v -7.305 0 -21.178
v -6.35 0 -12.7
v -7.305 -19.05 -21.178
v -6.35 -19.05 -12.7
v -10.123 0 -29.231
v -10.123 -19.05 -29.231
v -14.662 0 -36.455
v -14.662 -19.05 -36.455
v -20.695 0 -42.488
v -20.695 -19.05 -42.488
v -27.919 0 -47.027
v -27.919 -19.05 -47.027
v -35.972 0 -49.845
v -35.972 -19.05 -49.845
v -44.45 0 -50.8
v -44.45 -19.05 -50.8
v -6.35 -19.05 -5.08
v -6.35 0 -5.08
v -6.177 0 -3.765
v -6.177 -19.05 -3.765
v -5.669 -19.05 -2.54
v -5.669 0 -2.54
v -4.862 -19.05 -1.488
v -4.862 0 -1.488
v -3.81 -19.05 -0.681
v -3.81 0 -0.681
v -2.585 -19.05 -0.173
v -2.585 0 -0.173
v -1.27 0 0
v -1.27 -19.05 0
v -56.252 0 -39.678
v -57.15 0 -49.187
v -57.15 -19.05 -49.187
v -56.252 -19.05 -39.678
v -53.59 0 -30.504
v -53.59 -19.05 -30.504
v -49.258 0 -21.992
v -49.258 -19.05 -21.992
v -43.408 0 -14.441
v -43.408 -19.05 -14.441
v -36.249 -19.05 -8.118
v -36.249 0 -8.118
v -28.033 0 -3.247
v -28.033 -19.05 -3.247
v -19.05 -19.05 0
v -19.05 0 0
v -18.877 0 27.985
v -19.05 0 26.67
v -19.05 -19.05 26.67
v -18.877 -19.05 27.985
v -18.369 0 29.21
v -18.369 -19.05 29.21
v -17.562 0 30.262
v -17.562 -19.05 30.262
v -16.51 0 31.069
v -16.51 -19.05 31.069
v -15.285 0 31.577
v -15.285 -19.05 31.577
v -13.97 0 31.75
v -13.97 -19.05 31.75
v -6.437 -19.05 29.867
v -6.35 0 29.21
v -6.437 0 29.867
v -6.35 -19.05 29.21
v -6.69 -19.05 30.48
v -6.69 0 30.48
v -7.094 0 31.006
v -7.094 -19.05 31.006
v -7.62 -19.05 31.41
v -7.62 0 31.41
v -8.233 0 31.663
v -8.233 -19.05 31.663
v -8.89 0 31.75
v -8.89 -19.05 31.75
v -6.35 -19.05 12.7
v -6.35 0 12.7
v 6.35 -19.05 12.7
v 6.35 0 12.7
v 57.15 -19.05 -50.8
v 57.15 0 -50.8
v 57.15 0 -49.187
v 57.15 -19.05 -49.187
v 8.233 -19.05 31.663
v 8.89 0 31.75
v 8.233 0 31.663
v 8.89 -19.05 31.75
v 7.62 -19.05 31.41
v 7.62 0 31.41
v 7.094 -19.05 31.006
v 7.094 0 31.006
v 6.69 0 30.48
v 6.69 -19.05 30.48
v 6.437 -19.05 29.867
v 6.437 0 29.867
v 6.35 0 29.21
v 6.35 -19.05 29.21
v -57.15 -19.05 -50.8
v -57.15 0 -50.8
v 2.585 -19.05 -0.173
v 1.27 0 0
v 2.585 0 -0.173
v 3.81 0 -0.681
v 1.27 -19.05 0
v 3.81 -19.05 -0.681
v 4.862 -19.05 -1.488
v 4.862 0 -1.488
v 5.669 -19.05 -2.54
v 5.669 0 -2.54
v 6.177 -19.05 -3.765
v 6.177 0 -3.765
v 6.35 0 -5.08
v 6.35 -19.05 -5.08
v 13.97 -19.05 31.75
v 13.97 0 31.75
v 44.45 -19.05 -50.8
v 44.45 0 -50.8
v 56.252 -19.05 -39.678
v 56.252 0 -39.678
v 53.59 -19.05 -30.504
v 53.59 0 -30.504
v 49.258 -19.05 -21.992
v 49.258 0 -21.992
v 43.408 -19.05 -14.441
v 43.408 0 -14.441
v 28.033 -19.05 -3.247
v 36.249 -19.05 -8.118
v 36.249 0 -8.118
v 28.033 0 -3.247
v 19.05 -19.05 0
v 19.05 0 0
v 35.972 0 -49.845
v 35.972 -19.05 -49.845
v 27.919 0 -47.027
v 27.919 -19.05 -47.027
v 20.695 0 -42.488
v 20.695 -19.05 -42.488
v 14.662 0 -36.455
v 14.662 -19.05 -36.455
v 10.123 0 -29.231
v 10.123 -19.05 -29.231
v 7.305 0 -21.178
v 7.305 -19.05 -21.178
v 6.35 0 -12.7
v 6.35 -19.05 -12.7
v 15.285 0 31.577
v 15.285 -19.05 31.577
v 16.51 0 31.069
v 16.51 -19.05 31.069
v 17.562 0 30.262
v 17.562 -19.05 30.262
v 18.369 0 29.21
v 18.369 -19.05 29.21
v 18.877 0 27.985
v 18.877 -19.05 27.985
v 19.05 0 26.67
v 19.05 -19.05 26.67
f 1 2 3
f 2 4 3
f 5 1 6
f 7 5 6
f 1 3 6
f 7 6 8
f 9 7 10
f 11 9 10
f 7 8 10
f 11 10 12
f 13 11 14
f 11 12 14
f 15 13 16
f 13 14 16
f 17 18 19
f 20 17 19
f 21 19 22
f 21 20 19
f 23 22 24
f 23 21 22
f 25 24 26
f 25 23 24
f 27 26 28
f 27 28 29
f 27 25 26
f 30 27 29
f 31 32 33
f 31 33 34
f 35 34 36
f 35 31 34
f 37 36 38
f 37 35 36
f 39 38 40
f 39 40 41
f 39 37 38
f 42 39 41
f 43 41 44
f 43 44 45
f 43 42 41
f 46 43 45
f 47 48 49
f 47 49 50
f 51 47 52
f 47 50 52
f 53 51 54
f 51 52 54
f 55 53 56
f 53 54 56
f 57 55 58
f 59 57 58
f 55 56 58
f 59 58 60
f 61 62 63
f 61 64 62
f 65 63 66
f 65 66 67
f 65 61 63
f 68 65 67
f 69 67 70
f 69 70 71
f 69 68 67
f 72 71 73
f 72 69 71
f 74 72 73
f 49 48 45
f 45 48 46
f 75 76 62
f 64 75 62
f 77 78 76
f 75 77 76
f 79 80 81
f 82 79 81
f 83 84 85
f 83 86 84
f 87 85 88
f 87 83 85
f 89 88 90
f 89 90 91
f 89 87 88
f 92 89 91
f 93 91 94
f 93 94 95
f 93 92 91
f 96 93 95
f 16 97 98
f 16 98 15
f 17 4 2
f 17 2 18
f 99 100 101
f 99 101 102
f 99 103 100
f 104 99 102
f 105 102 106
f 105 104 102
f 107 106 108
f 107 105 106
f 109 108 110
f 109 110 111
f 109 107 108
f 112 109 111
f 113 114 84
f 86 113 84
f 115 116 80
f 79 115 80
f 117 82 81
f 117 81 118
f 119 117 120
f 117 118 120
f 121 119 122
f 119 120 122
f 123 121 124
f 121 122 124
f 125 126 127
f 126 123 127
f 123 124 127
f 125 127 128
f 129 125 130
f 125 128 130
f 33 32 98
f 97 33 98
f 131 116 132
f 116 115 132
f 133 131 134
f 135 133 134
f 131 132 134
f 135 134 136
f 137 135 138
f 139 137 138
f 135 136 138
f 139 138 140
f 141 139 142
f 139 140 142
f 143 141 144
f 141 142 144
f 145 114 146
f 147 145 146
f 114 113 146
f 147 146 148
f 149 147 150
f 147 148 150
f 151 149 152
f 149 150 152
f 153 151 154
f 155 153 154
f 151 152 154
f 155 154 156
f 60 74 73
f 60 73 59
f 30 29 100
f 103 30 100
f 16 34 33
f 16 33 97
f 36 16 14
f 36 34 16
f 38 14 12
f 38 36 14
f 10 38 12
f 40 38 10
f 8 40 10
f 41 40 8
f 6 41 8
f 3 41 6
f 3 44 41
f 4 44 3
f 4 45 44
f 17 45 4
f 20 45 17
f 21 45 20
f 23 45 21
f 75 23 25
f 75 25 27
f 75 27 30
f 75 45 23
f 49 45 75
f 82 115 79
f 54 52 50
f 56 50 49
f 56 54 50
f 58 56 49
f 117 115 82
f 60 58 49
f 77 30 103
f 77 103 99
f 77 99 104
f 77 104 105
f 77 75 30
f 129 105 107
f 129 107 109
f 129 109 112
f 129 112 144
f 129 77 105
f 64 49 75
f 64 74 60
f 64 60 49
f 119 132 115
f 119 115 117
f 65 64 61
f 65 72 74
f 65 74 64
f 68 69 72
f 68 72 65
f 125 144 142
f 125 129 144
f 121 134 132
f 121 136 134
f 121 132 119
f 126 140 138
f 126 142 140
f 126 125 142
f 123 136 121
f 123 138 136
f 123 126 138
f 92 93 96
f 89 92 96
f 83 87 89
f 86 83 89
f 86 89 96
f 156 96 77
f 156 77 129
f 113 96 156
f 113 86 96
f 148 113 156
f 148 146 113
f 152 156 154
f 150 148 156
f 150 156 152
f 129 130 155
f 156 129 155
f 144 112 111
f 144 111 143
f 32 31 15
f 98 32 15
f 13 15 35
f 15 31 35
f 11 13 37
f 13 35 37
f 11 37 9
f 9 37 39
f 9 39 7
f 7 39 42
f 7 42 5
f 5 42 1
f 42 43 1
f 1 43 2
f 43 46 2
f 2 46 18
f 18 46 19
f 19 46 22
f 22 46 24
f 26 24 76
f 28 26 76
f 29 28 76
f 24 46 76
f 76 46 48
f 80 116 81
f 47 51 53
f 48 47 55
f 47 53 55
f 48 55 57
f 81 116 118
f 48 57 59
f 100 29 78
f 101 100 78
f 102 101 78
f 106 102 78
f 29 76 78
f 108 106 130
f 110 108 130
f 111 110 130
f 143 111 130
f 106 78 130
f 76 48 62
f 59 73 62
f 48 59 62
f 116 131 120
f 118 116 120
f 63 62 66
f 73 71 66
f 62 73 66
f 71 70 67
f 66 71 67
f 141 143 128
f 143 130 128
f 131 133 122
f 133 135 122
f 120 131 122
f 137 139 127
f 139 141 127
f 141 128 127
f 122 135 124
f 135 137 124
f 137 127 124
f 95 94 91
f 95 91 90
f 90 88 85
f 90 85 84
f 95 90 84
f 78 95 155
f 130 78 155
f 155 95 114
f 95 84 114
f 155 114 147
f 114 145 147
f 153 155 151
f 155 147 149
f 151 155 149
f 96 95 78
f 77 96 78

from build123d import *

# Parameters (mm, degrees)
F0_W        = 6.35
F0_H        = 12.7
F1_DEPTH    = 19.05
F2_R        = 2.54
F3_R        = 38.1
F4_T1_DEPTH = 264.9844424842
F5_R        = 5.08
F6_R        = 5.08


# Not quite as in the source:
# - a fillet or chamfer that OpenCascade refuses, or shapes differently, is made with other operations: its cross-section is extruded or revolved along the edge and cut away or added


with BuildPart() as f1:
    # F0 (on Front) → F1 (new body)
    with BuildSketch(Plane.XZ):
        Polygon((-6.35, -50.8), (-6.35, 0), (-19.05, 0), (-57.15, 0), (-57.15, -50.8), align=None)
        Polygon((-19.05, 0), (-6.35, 0), (-6.35, 12.7), (-6.35, 31.75), (-19.05, 31.75), align=None)
        with Locations((-3.175, 6.35)):
            Rectangle(F0_W, F0_H)
        with Locations((3.175, 6.35)):
            Rectangle(F0_W, F0_H)
        Polygon((6.35, 12.7), (6.35, 0), (19.05, 0), (19.05, 31.75), (6.35, 31.75), align=None)
        Polygon((19.05, 0), (6.35, 0), (6.35, -50.8), (57.15, -50.8), (57.15, 0), align=None)
    extrude(amount=F1_DEPTH)

    # F2
    f2_edges = [f1.edges().sort_by_distance(p)[0] for p in [
        (6.35, -9.525, 31.75),
        (-6.35, -9.525, 31.75),
    ]]
    fillet(f2_edges, radius=F2_R)

    # F3
    f3_edges = [f1.edges().sort_by_distance(p)[0] for p in [
        (6.35, -9.525, -50.8),
        (-6.35, -9.525, -50.8),
    ]]
    fillet(f3_edges, radius=F3_R)

    # F4: fillet of radius 50.8 on 2 edges, made by hand

    # F4_s2 → F4_t1 (cut)
    with BuildSketch(Plane.XZ.offset(-122.9672212421)):
        with BuildLine():
            ThreePointArc((-57.15, -49.1868884968), (-46.5109262841, -18.0783687635), (-19.05, 0))
            Line((-19.05, 0), (-57.15, 0))
            Line((-57.15, 0), (-57.15, -49.1868884968))
        make_face()
        with BuildLine():
            ThreePointArc((57.15, -49.1868884968), (46.5109262841, -18.0783687635), (19.05, 0))
            Line((19.05, 0), (57.15, 0))
            Line((57.15, 0), (57.15, -49.1868884968))
        make_face()
    extrude(amount=F4_T1_DEPTH, mode=Mode.SUBTRACT)

    # F5
    f5_edges = [f1.edges().sort_by_distance(p)[0] for p in [
        (-19.05, -9.525, 31.75),
        (19.05, -9.525, 31.75),
    ]]
    fillet(f5_edges, radius=F5_R)

    # F6
    f6_edges = [f1.edges().sort_by_distance(p)[0] for p in [
        (6.35, -9.525, 0),
        (-6.35, -9.525, 0),
    ]]
    fillet(f6_edges, radius=F6_R)


solid = f1.part
